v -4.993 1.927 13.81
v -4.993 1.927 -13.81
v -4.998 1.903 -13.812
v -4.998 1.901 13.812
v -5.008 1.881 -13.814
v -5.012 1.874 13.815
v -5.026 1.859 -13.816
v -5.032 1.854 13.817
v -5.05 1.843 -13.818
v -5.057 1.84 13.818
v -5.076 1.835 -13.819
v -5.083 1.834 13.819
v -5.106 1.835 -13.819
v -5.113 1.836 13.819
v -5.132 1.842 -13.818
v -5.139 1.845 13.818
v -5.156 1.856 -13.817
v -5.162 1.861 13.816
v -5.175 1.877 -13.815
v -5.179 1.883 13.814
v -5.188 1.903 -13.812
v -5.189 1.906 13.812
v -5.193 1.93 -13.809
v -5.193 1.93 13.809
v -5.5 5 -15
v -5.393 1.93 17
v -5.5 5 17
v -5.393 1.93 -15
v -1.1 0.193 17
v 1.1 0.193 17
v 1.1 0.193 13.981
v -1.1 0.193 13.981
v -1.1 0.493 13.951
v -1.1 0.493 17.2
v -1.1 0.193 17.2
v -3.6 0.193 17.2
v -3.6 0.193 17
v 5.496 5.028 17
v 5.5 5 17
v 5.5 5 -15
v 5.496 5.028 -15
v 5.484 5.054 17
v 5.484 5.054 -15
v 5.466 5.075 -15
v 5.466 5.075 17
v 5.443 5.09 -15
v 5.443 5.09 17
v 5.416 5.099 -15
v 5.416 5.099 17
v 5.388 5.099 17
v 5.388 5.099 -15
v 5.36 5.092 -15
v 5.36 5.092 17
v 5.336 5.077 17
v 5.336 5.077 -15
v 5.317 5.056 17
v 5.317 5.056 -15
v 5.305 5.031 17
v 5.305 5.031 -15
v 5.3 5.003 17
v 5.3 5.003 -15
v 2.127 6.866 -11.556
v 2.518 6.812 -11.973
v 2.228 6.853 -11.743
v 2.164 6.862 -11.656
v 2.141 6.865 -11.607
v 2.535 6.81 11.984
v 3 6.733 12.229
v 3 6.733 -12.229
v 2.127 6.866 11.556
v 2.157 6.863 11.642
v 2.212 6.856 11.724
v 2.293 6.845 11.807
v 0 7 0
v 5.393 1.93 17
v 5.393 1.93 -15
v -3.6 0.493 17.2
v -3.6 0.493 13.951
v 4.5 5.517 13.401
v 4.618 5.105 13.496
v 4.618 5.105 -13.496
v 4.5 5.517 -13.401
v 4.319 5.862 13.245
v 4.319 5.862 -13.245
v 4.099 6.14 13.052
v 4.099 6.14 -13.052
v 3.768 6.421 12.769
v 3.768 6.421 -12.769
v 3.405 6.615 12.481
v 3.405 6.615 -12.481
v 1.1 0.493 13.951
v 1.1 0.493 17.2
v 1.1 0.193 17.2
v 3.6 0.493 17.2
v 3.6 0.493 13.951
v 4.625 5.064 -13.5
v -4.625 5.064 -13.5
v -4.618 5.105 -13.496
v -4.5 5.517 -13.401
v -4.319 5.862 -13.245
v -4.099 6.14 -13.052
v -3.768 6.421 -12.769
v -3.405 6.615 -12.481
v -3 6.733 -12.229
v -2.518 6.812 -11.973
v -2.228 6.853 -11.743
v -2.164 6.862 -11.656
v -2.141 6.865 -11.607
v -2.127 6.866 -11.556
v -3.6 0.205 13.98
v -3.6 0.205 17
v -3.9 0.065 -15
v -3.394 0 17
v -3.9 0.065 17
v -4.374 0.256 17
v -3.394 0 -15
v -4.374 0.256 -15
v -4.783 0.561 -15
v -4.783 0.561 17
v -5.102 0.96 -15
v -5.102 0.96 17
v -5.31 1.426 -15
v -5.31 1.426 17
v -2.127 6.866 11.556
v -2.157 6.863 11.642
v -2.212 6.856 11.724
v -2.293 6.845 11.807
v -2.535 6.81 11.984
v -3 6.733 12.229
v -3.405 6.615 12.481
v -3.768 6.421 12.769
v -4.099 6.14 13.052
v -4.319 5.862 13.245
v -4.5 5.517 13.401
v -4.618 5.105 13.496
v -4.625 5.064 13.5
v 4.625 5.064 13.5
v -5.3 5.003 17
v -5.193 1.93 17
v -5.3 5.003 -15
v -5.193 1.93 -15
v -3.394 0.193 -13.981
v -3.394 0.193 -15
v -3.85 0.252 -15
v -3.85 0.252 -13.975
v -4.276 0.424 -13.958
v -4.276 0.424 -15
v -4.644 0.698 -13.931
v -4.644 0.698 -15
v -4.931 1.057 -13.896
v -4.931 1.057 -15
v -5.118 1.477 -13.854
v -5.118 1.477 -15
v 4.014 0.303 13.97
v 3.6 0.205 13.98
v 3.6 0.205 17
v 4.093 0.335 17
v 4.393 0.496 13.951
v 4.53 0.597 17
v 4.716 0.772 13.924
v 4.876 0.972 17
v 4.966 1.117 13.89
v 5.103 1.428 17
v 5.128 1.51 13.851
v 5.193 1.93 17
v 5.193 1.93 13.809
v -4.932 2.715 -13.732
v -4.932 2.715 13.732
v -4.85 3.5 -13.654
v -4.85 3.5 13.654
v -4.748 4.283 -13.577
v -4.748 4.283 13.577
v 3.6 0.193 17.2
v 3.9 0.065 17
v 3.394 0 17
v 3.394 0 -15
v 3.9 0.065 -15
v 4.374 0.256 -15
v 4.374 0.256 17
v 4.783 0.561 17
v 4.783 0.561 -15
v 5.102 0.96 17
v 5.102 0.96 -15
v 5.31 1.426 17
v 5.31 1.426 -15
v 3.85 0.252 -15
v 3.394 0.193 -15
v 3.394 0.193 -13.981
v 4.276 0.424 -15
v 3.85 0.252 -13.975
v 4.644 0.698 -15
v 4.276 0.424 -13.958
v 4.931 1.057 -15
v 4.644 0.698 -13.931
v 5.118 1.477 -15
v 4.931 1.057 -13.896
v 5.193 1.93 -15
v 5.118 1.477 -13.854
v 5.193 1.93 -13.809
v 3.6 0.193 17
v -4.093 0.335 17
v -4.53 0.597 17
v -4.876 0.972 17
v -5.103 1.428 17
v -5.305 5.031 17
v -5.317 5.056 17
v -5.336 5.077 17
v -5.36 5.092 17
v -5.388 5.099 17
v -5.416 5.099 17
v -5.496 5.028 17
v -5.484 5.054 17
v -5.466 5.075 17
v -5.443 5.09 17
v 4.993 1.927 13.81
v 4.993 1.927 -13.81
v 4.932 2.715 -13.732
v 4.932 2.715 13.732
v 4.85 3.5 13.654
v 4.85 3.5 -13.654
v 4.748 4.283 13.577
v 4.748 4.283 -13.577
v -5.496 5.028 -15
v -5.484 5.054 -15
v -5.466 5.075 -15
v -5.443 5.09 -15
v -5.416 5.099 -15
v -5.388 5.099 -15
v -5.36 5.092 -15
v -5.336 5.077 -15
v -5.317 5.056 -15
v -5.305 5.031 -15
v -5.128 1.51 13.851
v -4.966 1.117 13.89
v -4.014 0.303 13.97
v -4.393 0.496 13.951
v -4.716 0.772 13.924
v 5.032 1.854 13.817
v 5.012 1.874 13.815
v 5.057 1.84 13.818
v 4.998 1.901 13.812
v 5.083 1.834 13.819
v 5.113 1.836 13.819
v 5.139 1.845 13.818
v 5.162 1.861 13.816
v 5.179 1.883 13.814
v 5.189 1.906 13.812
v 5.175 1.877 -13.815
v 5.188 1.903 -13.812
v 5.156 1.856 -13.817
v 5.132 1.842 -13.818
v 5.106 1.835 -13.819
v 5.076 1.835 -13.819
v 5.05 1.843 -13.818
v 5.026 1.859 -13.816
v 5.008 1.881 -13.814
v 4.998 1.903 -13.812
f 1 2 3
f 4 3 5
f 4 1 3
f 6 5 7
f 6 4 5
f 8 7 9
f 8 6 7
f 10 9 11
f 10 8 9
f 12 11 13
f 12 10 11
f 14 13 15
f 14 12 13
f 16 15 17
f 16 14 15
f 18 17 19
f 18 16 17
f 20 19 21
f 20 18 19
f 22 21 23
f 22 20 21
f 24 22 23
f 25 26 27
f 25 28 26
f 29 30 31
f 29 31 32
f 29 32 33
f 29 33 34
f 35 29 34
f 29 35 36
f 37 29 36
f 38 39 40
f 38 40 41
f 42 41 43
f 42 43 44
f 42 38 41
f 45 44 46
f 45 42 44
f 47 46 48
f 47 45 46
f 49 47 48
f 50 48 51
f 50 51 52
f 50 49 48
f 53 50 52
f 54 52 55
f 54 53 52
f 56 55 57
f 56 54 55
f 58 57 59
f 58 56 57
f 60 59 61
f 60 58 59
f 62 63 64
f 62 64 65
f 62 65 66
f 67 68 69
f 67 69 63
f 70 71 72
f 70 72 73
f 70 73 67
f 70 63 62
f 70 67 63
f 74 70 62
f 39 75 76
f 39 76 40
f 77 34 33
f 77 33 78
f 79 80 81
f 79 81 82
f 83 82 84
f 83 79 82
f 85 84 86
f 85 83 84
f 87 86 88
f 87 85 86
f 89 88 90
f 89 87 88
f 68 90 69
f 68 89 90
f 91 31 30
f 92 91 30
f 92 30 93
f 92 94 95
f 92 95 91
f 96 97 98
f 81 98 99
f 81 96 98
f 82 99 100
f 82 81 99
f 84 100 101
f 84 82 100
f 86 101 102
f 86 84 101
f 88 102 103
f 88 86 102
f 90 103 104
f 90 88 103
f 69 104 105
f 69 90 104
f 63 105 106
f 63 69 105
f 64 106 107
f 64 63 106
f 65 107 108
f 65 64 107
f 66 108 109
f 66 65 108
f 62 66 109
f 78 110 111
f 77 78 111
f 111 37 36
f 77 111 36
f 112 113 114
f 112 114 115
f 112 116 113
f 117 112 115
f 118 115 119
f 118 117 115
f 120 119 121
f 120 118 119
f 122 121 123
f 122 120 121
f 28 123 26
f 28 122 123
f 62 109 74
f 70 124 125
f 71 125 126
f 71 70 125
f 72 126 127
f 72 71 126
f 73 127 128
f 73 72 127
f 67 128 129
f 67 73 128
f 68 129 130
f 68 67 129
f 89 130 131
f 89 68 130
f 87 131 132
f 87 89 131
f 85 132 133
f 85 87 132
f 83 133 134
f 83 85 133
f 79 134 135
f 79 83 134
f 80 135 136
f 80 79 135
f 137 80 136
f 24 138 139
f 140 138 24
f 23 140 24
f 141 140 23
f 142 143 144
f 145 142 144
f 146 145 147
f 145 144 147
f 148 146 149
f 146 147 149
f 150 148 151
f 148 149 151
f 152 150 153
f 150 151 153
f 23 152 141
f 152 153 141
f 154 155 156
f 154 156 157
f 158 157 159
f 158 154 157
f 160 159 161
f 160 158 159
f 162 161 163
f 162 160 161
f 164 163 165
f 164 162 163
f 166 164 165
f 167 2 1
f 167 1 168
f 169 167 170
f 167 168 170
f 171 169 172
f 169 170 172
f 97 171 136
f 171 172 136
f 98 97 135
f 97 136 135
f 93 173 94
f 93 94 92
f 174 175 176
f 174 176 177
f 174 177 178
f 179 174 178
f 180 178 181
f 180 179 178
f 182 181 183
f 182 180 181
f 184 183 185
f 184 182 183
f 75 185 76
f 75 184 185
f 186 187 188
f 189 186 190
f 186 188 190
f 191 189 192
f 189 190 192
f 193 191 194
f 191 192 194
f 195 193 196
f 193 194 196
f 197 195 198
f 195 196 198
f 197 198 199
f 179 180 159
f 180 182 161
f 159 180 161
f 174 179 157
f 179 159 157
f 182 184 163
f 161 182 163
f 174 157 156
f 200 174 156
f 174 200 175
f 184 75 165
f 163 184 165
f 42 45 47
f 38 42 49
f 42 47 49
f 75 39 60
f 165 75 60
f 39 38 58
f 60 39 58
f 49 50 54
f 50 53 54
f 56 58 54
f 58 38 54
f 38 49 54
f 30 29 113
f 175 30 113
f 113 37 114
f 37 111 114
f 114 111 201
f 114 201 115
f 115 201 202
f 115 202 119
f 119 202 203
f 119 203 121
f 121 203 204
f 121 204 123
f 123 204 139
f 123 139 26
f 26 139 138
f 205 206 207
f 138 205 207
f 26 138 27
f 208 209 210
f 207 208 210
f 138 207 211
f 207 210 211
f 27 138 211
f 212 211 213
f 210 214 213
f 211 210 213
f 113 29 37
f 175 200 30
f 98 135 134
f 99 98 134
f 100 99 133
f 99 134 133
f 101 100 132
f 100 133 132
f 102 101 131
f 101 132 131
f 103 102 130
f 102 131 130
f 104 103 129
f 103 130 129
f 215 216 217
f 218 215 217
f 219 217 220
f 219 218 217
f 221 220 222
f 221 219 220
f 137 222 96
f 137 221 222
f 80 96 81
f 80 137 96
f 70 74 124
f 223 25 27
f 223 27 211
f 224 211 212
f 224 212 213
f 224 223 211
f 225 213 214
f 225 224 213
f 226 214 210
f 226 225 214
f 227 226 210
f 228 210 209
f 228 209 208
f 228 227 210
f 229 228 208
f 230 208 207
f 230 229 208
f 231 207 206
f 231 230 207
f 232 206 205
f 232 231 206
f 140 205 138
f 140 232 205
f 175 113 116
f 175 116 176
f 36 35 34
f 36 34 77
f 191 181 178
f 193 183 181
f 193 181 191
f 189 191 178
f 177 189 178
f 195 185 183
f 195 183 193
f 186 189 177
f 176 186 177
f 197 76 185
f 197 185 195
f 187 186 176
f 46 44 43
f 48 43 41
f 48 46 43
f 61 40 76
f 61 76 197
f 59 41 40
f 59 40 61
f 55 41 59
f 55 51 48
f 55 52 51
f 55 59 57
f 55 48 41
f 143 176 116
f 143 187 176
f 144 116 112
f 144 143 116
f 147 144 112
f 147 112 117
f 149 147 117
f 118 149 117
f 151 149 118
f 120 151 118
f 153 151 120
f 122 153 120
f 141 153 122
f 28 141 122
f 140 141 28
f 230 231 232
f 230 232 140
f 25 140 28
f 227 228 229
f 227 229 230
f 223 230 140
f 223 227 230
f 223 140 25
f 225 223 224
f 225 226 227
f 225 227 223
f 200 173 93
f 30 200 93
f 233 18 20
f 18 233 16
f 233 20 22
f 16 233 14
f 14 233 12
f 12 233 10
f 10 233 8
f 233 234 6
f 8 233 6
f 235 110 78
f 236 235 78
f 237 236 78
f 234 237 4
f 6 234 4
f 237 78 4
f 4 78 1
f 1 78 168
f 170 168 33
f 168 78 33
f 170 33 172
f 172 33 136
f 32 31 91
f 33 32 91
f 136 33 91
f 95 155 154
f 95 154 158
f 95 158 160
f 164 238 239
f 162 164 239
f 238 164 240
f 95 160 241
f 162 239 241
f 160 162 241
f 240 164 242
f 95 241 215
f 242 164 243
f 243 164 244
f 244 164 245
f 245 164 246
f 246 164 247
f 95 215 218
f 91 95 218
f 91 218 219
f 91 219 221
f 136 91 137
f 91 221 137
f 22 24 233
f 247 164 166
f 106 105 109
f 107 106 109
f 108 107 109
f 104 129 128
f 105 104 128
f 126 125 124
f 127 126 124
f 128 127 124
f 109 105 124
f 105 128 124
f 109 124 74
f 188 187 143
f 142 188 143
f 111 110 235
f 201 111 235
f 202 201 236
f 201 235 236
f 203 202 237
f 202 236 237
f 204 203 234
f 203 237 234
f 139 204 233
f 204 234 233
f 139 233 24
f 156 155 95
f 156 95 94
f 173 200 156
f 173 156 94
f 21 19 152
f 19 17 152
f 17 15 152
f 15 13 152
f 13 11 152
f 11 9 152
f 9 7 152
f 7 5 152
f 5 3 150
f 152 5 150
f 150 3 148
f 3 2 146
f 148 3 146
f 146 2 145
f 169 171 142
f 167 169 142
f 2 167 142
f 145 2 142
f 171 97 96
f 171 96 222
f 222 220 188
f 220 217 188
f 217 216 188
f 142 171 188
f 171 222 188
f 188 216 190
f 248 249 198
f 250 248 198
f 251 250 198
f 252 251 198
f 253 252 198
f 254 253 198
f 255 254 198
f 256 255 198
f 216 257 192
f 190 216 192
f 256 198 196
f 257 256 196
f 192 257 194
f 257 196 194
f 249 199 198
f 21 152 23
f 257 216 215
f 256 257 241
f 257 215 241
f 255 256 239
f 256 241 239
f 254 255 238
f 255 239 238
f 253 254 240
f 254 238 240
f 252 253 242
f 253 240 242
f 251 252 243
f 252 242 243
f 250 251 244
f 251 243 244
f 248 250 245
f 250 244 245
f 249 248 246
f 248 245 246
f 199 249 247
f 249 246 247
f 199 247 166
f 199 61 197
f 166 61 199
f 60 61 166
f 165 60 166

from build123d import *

# Parameters (mm, degrees)
PAD_DEPTH         = 14
POCKET_DEPTH      = 5.501
POCKET_DEPTH_BACK = 5.501
PAD001_DEPTH      = 17
PAD001_DEPTH_BACK = 15
SKETCH003_W       = 2.5
SKETCH003_H       = 4
PAD002_DEPTH      = 0.3


with BuildPart() as part:
    # Sketch → Pad (new body, symmetric)
    with BuildSketch(Plane.XY):
        with BuildLine():
            ThreePointArc((4.993006, 1.92728), (4.84786, 3.520957), (4.617941, 5.104626))
            ThreePointArc((4.617941, 5.104626), (4.065897, 6.174162), (3, 6.733201))
            ThreePointArc((3, 6.733201), (1.50592, 6.933169), (0, 7))
            Line((0, 7), (0, 0))
            Line((3.394019, 0), (0, 0))
            ThreePointArc((3.394019, 0), (4.783335, 0.56132), (5.3928, 1.930201))
            Line((5.3928, 1.930201), (5.5, 5))
            ThreePointArc((5.5, 5), (5.401745, 5.099985), (5.300061, 5.00349))
            Line((5.300061, 5.00349), (5.192739, 1.930201))
            ThreePointArc((4.993006, 1.92728), (5.094262, 1.833702), (5.192739, 1.930201))
        make_face()
    pad = extrude(amount=PAD_DEPTH, both=True)

    # Mirrored: Pad across Sketch V_Axis
    add(pad.mirror(Plane(origin=(0, 0, 0), x_dir=(0, 0, 1), z_dir=(1, 0, 0))))

    # Sketch001 → Pocket (cut, two sides)
    with BuildSketch(Plane.YZ) as pocket_sk:
        with BuildLine():
            Line((0, 14), (5.063511, 13.500005))
            ThreePointArc((6.866443, 11.555898), (6.333433, 12.869652), (5.063511, 13.500005))
            ThreePointArc((6.866443, -11.555898), (7, 0), (6.866443, 11.555898))
            ThreePointArc((5.063515, -13.499995), (6.333431, -12.869643), (6.866443, -11.555898))
            Line((5.063515, -13.499995), (0, -14))
            Line((0, -14), (0, -19))
            Line((0, -19), (10, -19))
            Line((10, -19), (10, 19))
            Line((10, 19), (0, 19))
            Line((0, 19), (0, 14))
        make_face()
    extrude(amount=-POCKET_DEPTH, mode=Mode.SUBTRACT)
    extrude(pocket_sk.sketch, amount=POCKET_DEPTH_BACK, mode=Mode.SUBTRACT)

    # Sketch002 → Pad001 (join, two sides)
    with BuildSketch(Plane.XY) as pad001_sk:
        with BuildLine():
            Line((5.3928, 1.930201), (5.5, 5))
            ThreePointArc((5.5, 5), (5.401745, 5.099985), (5.300061, 5.00349))
            Line((5.300061, 5.00349), (5.192739, 1.930201))
            ThreePointArc((3.394019, 0.193197), (4.644277, 0.698334), (5.192739, 1.930201))
            Line((0, 0.193197), (3.394019, 0.193197))
            Line((0, 0.193197), (0, 0))
            Line((3.394019, 0), (0, 0))
            ThreePointArc((3.394019, 0), (4.783335, 0.56132), (5.3928, 1.930201))
        make_face()
    pad001 = extrude(amount=PAD001_DEPTH) + extrude(pad001_sk.sketch, amount=-PAD001_DEPTH_BACK)

    # Mirrored001: Pad001 across Sketch002 V_Axis
    add(pad001.mirror(Plane(origin=(0, 0, 0), x_dir=(0, 0, 1), z_dir=(1, 0, 0))))

    # Sketch003 (on Face22 of Mirrored001) → Pad002 (join)
    with BuildSketch(Plane(origin=(0, 0.193197, 0), x_dir=(-1, 0, 0), z_dir=(0, 1, 0))):
        with Locations((-2.35, 15.2)):
            Rectangle(SKETCH003_W, SKETCH003_H)
        with Locations((2.35, 15.2)):
            Rectangle(SKETCH003_W, SKETCH003_H)
    extrude(amount=PAD002_DEPTH)


solid = part.part
